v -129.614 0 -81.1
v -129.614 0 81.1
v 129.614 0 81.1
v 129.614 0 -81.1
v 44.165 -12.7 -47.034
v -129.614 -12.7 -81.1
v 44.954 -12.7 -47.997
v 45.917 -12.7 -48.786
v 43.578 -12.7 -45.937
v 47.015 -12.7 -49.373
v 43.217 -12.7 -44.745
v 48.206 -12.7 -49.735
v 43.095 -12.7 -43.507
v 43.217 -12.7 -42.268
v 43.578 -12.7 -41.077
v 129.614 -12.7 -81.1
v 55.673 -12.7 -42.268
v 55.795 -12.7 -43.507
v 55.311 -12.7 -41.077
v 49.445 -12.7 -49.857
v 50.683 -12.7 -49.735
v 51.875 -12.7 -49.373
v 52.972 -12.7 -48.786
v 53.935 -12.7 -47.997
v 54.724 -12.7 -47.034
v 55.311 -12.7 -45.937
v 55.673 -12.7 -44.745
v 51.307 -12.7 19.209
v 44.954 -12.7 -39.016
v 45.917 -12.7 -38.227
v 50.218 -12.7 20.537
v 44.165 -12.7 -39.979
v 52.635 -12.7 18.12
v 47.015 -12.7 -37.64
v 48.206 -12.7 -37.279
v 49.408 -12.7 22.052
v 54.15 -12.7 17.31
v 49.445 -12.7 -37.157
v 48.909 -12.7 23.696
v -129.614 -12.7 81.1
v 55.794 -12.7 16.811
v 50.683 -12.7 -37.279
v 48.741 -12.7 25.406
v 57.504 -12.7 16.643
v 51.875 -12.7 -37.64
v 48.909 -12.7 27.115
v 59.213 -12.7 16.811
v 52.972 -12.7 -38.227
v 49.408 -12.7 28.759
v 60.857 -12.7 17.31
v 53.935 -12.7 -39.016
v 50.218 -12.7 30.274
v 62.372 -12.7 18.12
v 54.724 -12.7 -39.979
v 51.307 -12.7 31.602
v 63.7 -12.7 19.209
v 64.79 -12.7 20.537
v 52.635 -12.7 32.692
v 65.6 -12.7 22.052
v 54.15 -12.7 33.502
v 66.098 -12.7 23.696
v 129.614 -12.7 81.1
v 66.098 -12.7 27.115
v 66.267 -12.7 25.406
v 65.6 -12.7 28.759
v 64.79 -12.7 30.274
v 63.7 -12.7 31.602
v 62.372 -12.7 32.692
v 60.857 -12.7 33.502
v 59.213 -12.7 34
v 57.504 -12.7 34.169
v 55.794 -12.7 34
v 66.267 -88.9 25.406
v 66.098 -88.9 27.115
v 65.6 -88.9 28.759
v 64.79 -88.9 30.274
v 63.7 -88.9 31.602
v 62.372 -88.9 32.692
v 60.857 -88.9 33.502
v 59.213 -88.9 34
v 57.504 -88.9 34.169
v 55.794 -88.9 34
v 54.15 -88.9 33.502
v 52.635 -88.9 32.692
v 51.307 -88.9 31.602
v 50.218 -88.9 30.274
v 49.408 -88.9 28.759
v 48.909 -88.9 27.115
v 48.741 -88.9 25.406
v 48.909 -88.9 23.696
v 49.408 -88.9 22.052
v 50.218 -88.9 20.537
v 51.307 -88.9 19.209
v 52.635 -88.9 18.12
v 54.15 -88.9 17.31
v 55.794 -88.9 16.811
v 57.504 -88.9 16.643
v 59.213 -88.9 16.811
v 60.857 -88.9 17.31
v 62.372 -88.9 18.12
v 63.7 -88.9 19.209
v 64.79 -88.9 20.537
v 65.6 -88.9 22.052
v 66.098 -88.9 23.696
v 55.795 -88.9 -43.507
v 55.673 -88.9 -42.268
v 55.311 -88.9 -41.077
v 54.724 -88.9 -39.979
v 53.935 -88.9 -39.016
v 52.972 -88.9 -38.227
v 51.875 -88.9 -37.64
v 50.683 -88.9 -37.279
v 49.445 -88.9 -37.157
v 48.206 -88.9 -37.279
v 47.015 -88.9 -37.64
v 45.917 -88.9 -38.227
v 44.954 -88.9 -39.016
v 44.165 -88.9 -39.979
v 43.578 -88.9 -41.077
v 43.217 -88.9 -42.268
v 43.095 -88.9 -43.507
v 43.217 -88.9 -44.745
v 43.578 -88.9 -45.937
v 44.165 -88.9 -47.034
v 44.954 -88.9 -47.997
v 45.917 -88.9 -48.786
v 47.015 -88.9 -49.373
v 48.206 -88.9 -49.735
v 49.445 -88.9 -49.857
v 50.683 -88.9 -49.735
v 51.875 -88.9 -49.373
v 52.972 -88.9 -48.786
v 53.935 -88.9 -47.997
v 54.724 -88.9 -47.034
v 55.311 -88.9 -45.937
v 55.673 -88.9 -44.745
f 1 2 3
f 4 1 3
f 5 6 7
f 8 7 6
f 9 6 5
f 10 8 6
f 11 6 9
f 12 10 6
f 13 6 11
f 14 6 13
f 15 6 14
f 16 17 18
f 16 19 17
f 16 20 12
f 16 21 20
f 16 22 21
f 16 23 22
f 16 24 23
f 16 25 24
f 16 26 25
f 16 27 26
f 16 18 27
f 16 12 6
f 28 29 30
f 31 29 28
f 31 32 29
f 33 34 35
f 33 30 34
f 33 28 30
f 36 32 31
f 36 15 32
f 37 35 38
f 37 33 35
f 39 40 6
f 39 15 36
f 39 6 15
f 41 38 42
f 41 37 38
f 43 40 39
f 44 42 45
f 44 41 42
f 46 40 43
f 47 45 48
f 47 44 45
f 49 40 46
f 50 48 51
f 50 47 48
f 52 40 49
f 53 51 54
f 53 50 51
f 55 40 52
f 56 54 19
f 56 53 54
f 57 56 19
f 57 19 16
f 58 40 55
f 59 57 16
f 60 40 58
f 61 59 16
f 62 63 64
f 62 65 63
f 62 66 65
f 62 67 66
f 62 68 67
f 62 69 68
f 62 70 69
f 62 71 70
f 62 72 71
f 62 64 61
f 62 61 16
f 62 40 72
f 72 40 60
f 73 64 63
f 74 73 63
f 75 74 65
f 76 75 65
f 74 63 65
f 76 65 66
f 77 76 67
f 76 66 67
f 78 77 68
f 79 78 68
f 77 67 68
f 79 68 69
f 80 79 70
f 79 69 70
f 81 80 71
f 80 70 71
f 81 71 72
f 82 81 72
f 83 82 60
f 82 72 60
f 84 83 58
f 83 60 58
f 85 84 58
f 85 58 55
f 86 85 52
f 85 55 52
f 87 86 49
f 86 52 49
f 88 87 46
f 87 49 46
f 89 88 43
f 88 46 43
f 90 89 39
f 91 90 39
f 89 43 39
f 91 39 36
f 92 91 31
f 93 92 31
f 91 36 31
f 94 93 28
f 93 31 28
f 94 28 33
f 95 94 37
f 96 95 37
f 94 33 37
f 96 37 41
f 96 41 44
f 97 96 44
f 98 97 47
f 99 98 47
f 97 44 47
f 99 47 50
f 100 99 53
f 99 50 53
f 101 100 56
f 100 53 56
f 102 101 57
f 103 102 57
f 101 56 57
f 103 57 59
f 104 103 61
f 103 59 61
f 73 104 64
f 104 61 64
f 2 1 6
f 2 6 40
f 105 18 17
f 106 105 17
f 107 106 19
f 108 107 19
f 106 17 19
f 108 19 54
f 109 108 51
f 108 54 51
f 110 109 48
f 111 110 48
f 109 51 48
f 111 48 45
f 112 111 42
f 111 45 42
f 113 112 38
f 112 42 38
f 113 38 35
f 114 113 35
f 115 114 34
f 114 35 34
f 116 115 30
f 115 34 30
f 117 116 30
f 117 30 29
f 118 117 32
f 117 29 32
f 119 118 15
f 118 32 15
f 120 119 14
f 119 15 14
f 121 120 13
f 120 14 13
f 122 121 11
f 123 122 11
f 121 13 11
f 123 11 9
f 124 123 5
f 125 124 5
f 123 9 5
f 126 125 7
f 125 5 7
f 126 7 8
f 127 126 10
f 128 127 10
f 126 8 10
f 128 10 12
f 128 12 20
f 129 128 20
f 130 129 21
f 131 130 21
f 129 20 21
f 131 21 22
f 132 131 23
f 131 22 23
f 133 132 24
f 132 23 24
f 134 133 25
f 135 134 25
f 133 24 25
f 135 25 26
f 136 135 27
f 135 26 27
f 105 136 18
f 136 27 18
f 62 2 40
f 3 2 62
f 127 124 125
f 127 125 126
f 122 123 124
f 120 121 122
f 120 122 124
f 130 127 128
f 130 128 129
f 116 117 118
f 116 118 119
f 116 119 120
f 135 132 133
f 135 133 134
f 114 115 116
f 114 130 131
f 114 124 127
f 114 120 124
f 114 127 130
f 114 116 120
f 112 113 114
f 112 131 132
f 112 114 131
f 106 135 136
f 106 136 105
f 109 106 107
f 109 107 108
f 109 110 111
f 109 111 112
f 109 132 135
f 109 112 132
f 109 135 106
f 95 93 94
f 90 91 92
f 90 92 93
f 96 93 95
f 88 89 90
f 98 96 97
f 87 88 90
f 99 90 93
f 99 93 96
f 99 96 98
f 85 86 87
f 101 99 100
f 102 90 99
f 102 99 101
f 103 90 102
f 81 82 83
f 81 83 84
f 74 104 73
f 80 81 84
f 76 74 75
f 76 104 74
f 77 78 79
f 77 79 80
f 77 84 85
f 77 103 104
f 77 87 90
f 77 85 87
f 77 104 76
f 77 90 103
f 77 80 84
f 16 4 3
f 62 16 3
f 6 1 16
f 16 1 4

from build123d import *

# Parameters (mm, degrees)
F0_W     = 259.227424
F0_H     = 162.200198
F1_DEPTH = 12.7
F2_R     = 8.763
F3_DEPTH = 76.2
F4_R     = 6.35
F5_DEPTH = 76.2


with BuildPart() as f1:
    # F0 (on Front) → F1 (new body)
    with BuildSketch(Plane.XZ):
        Rectangle(F0_W, F0_H)
    extrude(amount=F1_DEPTH)

    # F2 (on face) → F3 (join)
    with BuildSketch(Plane.XZ.offset(12.7)):
        with Locations((57.503741, 25.405739)):
            Circle(F2_R)
    extrude(amount=F3_DEPTH)

    # F4 (on face) → F5 (join)
    with BuildSketch(Plane.XZ.offset(12.7)):
        with Locations((49.444617, -43.506545)):
            Circle(F4_R)
    extrude(amount=F5_DEPTH)


solid = f1.part
